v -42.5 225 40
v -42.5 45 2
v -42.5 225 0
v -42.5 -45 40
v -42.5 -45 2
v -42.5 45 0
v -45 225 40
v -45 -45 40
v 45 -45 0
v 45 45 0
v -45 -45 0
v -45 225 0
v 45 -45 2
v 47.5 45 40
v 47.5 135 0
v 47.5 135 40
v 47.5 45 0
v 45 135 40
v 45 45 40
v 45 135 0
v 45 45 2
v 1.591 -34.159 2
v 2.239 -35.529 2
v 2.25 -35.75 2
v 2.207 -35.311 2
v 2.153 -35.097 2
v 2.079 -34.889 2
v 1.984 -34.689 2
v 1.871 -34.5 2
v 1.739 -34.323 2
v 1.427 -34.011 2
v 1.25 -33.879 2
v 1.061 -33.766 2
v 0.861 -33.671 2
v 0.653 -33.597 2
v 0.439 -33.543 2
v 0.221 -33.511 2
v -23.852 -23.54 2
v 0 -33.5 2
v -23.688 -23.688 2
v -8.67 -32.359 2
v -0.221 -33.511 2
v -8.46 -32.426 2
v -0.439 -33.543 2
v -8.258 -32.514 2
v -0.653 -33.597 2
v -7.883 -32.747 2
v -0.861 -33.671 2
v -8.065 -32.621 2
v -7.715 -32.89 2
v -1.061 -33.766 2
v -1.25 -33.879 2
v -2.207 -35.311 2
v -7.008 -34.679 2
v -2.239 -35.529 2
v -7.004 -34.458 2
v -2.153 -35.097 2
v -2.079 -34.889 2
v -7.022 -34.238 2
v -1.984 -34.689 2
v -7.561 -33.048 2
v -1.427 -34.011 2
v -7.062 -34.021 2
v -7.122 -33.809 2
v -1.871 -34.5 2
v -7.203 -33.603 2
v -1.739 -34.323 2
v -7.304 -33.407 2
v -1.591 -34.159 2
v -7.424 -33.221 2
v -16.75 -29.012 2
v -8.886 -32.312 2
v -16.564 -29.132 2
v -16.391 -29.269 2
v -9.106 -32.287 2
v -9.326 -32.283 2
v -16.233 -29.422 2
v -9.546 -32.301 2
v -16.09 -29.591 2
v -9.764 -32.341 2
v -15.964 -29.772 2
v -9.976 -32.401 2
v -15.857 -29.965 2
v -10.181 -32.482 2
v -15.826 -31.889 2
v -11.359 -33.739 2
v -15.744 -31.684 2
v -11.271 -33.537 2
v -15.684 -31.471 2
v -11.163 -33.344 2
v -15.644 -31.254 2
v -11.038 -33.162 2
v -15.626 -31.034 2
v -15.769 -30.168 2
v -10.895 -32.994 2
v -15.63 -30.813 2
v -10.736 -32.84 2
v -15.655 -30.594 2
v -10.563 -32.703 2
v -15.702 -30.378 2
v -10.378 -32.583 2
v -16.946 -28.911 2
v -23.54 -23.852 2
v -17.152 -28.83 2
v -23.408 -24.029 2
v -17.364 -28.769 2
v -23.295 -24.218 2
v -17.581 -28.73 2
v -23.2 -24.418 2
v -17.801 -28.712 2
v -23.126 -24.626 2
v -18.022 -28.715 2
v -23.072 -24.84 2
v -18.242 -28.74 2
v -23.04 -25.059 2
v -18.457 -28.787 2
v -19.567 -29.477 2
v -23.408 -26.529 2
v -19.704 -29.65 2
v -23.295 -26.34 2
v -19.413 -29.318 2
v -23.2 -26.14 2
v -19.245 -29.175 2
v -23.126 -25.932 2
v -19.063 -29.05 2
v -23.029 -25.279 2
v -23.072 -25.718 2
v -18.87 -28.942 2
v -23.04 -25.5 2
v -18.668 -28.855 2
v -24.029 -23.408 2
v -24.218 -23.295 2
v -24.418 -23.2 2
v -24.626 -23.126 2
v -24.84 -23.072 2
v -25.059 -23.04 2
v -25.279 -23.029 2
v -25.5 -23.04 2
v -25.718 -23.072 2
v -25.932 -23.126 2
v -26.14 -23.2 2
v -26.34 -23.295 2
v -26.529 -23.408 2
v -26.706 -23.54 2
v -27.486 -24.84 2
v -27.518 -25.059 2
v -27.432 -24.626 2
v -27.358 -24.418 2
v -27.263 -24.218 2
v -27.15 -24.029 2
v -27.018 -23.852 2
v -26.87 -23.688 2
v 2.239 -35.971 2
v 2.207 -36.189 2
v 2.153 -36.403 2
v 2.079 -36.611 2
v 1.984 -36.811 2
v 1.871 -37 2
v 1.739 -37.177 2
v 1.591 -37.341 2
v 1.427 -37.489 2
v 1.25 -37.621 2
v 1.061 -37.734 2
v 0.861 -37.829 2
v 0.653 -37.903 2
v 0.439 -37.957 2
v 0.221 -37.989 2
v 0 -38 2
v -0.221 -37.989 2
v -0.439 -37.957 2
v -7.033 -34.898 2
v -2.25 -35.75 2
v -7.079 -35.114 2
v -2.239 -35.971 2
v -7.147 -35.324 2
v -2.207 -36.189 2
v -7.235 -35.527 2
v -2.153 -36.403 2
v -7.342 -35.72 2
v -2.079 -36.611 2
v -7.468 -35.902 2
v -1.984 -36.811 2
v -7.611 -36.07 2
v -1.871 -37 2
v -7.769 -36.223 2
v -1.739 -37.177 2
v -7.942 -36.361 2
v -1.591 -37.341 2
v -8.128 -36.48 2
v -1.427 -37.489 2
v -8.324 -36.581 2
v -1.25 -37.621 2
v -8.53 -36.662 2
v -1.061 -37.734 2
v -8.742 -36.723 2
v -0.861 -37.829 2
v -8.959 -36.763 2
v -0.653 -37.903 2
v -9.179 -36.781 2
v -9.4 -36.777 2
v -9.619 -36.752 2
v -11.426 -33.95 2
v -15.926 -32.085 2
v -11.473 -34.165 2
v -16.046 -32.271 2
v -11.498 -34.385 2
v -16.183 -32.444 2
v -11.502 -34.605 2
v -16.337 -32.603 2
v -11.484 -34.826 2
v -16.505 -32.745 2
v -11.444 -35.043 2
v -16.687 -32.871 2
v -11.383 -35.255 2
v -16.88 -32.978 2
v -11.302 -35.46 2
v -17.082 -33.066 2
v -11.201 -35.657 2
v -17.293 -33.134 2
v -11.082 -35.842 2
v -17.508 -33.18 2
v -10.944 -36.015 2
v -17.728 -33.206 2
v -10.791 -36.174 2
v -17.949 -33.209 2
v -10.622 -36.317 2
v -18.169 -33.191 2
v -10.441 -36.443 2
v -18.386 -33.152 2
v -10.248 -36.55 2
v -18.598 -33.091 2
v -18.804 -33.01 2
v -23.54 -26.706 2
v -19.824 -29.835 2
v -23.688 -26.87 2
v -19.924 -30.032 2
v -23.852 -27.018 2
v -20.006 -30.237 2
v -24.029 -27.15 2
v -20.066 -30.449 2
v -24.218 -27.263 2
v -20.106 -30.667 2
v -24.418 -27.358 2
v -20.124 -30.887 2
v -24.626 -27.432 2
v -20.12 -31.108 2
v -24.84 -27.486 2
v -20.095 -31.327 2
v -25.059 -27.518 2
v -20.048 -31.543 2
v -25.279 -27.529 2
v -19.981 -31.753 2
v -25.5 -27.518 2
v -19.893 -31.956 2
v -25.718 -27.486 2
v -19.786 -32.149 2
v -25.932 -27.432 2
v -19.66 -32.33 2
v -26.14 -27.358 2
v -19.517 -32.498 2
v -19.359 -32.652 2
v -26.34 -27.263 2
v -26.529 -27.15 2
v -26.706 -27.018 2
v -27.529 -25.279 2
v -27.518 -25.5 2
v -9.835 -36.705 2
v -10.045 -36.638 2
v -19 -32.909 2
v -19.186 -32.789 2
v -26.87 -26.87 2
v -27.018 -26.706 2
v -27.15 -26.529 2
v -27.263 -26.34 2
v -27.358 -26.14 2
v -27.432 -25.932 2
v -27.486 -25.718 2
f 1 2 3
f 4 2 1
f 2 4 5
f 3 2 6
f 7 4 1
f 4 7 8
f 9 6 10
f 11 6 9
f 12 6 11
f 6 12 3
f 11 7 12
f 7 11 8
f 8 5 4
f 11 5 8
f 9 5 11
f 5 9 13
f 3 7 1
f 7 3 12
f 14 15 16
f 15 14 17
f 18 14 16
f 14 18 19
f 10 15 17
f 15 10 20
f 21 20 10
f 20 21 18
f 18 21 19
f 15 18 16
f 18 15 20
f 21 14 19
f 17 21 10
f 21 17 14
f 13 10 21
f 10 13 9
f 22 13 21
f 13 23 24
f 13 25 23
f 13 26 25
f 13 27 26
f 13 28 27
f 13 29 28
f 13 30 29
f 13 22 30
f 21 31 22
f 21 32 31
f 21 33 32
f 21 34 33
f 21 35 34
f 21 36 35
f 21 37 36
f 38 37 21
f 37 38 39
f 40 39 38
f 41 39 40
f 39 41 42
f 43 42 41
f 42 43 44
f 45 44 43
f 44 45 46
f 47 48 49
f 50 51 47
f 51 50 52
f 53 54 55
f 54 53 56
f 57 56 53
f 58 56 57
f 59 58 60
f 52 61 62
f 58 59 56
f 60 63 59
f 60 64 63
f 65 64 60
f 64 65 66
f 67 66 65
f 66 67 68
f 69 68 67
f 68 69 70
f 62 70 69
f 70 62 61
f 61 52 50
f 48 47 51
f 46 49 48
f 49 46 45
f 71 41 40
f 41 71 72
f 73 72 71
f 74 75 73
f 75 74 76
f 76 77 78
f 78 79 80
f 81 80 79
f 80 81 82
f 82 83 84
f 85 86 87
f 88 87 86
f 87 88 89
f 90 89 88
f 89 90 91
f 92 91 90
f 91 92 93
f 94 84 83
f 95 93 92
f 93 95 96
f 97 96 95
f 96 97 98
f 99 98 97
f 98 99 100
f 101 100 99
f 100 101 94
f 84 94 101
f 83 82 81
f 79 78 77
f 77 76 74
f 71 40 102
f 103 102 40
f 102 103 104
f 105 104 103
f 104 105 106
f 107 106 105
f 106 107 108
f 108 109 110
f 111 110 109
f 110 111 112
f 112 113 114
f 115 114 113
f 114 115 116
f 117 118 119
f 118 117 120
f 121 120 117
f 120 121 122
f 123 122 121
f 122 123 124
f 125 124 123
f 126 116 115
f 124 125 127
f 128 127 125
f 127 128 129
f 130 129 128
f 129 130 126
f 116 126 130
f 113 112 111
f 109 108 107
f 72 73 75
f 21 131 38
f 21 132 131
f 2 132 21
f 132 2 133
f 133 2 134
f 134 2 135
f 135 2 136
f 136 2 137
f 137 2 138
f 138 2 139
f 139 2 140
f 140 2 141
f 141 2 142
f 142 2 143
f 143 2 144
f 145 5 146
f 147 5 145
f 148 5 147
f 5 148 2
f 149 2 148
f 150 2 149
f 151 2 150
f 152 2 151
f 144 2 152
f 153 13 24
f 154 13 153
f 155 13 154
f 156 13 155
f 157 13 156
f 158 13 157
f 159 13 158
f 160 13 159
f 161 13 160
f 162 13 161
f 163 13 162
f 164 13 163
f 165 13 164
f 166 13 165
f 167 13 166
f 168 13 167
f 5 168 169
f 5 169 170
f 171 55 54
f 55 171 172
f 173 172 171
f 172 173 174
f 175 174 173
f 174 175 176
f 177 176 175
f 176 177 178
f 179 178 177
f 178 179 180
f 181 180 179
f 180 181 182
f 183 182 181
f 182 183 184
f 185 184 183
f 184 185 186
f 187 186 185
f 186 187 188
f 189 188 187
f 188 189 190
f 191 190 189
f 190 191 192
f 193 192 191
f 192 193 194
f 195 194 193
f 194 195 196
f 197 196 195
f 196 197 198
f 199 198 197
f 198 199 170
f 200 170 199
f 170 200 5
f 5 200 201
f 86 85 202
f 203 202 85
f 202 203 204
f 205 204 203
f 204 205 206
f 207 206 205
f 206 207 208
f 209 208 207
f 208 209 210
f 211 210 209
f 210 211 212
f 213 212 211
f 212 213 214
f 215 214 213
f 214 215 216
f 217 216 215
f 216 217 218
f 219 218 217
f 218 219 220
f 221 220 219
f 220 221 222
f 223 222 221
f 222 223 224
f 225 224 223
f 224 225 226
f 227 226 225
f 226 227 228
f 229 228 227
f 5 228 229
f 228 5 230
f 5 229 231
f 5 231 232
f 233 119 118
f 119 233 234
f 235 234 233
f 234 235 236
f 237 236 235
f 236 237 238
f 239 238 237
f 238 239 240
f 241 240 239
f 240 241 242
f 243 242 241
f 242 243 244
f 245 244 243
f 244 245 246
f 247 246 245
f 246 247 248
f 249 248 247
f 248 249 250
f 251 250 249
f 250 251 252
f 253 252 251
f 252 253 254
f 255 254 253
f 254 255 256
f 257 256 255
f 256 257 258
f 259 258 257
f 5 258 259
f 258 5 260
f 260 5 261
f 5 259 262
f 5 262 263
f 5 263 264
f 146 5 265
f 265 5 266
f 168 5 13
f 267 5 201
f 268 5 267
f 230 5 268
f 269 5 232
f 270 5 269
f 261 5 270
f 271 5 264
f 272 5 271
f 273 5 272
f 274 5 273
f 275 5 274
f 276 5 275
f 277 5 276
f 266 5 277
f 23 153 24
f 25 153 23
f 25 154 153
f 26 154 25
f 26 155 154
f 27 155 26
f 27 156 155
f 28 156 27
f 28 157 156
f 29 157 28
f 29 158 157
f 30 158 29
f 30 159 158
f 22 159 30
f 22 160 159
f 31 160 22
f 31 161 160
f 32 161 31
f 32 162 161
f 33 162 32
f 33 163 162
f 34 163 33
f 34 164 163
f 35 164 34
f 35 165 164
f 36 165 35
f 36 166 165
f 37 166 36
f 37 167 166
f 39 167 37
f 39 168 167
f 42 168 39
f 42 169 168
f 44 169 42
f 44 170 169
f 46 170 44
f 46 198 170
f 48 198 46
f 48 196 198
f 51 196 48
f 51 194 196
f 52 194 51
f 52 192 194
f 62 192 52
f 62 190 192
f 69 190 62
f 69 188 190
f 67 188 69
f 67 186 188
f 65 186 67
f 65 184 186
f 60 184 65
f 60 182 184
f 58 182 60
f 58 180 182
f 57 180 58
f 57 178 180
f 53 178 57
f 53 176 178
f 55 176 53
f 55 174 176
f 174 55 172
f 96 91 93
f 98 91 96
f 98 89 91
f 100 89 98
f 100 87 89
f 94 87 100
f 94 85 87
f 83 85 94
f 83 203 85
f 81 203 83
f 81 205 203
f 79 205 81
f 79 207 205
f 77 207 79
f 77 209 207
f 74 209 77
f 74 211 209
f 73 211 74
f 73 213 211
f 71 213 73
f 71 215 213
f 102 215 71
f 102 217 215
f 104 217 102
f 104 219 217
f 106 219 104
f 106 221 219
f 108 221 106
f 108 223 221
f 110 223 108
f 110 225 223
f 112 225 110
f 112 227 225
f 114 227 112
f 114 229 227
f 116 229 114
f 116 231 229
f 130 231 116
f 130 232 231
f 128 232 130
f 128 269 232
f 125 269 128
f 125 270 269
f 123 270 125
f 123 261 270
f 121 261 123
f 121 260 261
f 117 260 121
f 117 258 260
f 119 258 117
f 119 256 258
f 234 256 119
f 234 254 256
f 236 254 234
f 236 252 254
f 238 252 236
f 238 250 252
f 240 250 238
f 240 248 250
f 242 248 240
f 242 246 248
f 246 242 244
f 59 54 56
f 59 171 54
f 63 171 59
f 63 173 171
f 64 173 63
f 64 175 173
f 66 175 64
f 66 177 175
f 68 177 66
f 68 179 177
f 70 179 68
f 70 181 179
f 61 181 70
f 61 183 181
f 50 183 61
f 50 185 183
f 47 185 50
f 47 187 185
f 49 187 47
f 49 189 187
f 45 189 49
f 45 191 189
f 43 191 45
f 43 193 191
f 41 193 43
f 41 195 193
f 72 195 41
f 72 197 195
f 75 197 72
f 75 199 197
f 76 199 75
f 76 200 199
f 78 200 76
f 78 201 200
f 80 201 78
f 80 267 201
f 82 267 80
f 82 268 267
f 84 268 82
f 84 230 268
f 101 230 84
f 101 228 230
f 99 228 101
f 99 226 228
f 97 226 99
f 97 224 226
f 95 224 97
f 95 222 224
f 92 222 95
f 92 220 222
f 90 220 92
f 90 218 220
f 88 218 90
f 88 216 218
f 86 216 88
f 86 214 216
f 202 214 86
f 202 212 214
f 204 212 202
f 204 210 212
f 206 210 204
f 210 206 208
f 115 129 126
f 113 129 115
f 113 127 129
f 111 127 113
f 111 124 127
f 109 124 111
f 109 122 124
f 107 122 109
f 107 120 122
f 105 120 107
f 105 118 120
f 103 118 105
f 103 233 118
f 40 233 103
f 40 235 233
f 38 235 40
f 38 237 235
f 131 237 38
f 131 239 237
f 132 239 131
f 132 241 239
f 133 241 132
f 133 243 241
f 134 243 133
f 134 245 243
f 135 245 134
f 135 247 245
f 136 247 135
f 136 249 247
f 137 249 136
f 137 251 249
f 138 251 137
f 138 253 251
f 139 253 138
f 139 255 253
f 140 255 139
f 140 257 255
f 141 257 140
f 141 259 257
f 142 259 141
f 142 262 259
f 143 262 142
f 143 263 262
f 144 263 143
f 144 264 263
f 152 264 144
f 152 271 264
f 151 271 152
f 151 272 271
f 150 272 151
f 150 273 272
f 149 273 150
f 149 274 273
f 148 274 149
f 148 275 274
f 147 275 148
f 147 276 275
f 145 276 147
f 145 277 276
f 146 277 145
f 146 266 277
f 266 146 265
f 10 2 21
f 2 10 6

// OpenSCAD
// DIY magnetic stirrer housing - print orientation (upside down)
// Units: mm. Fan: 80 mm PC case fan.

$fn = 64;

// --- Dimensions ---
top_t        = 2;     // top plate thickness (z = 0 to 2)
wall_t       = 2.5;   // wall thickness
box_h        = 40;    // total height of walls (z = 0 to 40)
outer_x      = 90;    // outer size in X
outer_y      = 90;    // outer size in Y
screw_h      = 4.5;   // M4 screw hole diameter
screw_n      = 4;     // number of screw holes
screw_pitch  = 71.5;  // square pattern pitch for screw holes
notch_w      = 12;    // cable notch width
notch_d      = 8;     // notch depth from open edge (z = 32 to 40)
eps          = 0.5;   // cutter overshoot past faces

// --- Derived ---
inner_r      = (outer_x - 2 * wall_t) / 2;   // inner radius of box
notch_x      = -screw_pitch / 2 - notch_w / 2; // notch wall X position

difference() {
    union() {
        // Top plate
        translate([-outer_x / 2, -outer_y / 2, 0])
            cube([outer_x, outer_y, top_t]);

        // Walls, open top
        for (x = [-outer_x / 2, outer_x / 2])
            for (y = [-outer_y / 2, outer_y / 2])
                translate([x, y, 0])
                    cube([wall_t, outer_x - x + y, box_h]);
    }

    // Screw holes through top plate
    for (i = [0 : screw_n - 1]) {
        a = i * screw_pitch / (screw_n - 1);
        translate([0, 0, top_t])
            rotate([0, 0, a * 90])
                translate([0, -screw_pitch / 2, 0])
                    cylinder(d = screw_h, h = top_t + eps);
    }

    // Cable notch in one wall
    translate([notch_x, 0, box_h - notch_d])
        cube([notch_w, outer_y + 2 * eps, notch_d + eps]);
}
